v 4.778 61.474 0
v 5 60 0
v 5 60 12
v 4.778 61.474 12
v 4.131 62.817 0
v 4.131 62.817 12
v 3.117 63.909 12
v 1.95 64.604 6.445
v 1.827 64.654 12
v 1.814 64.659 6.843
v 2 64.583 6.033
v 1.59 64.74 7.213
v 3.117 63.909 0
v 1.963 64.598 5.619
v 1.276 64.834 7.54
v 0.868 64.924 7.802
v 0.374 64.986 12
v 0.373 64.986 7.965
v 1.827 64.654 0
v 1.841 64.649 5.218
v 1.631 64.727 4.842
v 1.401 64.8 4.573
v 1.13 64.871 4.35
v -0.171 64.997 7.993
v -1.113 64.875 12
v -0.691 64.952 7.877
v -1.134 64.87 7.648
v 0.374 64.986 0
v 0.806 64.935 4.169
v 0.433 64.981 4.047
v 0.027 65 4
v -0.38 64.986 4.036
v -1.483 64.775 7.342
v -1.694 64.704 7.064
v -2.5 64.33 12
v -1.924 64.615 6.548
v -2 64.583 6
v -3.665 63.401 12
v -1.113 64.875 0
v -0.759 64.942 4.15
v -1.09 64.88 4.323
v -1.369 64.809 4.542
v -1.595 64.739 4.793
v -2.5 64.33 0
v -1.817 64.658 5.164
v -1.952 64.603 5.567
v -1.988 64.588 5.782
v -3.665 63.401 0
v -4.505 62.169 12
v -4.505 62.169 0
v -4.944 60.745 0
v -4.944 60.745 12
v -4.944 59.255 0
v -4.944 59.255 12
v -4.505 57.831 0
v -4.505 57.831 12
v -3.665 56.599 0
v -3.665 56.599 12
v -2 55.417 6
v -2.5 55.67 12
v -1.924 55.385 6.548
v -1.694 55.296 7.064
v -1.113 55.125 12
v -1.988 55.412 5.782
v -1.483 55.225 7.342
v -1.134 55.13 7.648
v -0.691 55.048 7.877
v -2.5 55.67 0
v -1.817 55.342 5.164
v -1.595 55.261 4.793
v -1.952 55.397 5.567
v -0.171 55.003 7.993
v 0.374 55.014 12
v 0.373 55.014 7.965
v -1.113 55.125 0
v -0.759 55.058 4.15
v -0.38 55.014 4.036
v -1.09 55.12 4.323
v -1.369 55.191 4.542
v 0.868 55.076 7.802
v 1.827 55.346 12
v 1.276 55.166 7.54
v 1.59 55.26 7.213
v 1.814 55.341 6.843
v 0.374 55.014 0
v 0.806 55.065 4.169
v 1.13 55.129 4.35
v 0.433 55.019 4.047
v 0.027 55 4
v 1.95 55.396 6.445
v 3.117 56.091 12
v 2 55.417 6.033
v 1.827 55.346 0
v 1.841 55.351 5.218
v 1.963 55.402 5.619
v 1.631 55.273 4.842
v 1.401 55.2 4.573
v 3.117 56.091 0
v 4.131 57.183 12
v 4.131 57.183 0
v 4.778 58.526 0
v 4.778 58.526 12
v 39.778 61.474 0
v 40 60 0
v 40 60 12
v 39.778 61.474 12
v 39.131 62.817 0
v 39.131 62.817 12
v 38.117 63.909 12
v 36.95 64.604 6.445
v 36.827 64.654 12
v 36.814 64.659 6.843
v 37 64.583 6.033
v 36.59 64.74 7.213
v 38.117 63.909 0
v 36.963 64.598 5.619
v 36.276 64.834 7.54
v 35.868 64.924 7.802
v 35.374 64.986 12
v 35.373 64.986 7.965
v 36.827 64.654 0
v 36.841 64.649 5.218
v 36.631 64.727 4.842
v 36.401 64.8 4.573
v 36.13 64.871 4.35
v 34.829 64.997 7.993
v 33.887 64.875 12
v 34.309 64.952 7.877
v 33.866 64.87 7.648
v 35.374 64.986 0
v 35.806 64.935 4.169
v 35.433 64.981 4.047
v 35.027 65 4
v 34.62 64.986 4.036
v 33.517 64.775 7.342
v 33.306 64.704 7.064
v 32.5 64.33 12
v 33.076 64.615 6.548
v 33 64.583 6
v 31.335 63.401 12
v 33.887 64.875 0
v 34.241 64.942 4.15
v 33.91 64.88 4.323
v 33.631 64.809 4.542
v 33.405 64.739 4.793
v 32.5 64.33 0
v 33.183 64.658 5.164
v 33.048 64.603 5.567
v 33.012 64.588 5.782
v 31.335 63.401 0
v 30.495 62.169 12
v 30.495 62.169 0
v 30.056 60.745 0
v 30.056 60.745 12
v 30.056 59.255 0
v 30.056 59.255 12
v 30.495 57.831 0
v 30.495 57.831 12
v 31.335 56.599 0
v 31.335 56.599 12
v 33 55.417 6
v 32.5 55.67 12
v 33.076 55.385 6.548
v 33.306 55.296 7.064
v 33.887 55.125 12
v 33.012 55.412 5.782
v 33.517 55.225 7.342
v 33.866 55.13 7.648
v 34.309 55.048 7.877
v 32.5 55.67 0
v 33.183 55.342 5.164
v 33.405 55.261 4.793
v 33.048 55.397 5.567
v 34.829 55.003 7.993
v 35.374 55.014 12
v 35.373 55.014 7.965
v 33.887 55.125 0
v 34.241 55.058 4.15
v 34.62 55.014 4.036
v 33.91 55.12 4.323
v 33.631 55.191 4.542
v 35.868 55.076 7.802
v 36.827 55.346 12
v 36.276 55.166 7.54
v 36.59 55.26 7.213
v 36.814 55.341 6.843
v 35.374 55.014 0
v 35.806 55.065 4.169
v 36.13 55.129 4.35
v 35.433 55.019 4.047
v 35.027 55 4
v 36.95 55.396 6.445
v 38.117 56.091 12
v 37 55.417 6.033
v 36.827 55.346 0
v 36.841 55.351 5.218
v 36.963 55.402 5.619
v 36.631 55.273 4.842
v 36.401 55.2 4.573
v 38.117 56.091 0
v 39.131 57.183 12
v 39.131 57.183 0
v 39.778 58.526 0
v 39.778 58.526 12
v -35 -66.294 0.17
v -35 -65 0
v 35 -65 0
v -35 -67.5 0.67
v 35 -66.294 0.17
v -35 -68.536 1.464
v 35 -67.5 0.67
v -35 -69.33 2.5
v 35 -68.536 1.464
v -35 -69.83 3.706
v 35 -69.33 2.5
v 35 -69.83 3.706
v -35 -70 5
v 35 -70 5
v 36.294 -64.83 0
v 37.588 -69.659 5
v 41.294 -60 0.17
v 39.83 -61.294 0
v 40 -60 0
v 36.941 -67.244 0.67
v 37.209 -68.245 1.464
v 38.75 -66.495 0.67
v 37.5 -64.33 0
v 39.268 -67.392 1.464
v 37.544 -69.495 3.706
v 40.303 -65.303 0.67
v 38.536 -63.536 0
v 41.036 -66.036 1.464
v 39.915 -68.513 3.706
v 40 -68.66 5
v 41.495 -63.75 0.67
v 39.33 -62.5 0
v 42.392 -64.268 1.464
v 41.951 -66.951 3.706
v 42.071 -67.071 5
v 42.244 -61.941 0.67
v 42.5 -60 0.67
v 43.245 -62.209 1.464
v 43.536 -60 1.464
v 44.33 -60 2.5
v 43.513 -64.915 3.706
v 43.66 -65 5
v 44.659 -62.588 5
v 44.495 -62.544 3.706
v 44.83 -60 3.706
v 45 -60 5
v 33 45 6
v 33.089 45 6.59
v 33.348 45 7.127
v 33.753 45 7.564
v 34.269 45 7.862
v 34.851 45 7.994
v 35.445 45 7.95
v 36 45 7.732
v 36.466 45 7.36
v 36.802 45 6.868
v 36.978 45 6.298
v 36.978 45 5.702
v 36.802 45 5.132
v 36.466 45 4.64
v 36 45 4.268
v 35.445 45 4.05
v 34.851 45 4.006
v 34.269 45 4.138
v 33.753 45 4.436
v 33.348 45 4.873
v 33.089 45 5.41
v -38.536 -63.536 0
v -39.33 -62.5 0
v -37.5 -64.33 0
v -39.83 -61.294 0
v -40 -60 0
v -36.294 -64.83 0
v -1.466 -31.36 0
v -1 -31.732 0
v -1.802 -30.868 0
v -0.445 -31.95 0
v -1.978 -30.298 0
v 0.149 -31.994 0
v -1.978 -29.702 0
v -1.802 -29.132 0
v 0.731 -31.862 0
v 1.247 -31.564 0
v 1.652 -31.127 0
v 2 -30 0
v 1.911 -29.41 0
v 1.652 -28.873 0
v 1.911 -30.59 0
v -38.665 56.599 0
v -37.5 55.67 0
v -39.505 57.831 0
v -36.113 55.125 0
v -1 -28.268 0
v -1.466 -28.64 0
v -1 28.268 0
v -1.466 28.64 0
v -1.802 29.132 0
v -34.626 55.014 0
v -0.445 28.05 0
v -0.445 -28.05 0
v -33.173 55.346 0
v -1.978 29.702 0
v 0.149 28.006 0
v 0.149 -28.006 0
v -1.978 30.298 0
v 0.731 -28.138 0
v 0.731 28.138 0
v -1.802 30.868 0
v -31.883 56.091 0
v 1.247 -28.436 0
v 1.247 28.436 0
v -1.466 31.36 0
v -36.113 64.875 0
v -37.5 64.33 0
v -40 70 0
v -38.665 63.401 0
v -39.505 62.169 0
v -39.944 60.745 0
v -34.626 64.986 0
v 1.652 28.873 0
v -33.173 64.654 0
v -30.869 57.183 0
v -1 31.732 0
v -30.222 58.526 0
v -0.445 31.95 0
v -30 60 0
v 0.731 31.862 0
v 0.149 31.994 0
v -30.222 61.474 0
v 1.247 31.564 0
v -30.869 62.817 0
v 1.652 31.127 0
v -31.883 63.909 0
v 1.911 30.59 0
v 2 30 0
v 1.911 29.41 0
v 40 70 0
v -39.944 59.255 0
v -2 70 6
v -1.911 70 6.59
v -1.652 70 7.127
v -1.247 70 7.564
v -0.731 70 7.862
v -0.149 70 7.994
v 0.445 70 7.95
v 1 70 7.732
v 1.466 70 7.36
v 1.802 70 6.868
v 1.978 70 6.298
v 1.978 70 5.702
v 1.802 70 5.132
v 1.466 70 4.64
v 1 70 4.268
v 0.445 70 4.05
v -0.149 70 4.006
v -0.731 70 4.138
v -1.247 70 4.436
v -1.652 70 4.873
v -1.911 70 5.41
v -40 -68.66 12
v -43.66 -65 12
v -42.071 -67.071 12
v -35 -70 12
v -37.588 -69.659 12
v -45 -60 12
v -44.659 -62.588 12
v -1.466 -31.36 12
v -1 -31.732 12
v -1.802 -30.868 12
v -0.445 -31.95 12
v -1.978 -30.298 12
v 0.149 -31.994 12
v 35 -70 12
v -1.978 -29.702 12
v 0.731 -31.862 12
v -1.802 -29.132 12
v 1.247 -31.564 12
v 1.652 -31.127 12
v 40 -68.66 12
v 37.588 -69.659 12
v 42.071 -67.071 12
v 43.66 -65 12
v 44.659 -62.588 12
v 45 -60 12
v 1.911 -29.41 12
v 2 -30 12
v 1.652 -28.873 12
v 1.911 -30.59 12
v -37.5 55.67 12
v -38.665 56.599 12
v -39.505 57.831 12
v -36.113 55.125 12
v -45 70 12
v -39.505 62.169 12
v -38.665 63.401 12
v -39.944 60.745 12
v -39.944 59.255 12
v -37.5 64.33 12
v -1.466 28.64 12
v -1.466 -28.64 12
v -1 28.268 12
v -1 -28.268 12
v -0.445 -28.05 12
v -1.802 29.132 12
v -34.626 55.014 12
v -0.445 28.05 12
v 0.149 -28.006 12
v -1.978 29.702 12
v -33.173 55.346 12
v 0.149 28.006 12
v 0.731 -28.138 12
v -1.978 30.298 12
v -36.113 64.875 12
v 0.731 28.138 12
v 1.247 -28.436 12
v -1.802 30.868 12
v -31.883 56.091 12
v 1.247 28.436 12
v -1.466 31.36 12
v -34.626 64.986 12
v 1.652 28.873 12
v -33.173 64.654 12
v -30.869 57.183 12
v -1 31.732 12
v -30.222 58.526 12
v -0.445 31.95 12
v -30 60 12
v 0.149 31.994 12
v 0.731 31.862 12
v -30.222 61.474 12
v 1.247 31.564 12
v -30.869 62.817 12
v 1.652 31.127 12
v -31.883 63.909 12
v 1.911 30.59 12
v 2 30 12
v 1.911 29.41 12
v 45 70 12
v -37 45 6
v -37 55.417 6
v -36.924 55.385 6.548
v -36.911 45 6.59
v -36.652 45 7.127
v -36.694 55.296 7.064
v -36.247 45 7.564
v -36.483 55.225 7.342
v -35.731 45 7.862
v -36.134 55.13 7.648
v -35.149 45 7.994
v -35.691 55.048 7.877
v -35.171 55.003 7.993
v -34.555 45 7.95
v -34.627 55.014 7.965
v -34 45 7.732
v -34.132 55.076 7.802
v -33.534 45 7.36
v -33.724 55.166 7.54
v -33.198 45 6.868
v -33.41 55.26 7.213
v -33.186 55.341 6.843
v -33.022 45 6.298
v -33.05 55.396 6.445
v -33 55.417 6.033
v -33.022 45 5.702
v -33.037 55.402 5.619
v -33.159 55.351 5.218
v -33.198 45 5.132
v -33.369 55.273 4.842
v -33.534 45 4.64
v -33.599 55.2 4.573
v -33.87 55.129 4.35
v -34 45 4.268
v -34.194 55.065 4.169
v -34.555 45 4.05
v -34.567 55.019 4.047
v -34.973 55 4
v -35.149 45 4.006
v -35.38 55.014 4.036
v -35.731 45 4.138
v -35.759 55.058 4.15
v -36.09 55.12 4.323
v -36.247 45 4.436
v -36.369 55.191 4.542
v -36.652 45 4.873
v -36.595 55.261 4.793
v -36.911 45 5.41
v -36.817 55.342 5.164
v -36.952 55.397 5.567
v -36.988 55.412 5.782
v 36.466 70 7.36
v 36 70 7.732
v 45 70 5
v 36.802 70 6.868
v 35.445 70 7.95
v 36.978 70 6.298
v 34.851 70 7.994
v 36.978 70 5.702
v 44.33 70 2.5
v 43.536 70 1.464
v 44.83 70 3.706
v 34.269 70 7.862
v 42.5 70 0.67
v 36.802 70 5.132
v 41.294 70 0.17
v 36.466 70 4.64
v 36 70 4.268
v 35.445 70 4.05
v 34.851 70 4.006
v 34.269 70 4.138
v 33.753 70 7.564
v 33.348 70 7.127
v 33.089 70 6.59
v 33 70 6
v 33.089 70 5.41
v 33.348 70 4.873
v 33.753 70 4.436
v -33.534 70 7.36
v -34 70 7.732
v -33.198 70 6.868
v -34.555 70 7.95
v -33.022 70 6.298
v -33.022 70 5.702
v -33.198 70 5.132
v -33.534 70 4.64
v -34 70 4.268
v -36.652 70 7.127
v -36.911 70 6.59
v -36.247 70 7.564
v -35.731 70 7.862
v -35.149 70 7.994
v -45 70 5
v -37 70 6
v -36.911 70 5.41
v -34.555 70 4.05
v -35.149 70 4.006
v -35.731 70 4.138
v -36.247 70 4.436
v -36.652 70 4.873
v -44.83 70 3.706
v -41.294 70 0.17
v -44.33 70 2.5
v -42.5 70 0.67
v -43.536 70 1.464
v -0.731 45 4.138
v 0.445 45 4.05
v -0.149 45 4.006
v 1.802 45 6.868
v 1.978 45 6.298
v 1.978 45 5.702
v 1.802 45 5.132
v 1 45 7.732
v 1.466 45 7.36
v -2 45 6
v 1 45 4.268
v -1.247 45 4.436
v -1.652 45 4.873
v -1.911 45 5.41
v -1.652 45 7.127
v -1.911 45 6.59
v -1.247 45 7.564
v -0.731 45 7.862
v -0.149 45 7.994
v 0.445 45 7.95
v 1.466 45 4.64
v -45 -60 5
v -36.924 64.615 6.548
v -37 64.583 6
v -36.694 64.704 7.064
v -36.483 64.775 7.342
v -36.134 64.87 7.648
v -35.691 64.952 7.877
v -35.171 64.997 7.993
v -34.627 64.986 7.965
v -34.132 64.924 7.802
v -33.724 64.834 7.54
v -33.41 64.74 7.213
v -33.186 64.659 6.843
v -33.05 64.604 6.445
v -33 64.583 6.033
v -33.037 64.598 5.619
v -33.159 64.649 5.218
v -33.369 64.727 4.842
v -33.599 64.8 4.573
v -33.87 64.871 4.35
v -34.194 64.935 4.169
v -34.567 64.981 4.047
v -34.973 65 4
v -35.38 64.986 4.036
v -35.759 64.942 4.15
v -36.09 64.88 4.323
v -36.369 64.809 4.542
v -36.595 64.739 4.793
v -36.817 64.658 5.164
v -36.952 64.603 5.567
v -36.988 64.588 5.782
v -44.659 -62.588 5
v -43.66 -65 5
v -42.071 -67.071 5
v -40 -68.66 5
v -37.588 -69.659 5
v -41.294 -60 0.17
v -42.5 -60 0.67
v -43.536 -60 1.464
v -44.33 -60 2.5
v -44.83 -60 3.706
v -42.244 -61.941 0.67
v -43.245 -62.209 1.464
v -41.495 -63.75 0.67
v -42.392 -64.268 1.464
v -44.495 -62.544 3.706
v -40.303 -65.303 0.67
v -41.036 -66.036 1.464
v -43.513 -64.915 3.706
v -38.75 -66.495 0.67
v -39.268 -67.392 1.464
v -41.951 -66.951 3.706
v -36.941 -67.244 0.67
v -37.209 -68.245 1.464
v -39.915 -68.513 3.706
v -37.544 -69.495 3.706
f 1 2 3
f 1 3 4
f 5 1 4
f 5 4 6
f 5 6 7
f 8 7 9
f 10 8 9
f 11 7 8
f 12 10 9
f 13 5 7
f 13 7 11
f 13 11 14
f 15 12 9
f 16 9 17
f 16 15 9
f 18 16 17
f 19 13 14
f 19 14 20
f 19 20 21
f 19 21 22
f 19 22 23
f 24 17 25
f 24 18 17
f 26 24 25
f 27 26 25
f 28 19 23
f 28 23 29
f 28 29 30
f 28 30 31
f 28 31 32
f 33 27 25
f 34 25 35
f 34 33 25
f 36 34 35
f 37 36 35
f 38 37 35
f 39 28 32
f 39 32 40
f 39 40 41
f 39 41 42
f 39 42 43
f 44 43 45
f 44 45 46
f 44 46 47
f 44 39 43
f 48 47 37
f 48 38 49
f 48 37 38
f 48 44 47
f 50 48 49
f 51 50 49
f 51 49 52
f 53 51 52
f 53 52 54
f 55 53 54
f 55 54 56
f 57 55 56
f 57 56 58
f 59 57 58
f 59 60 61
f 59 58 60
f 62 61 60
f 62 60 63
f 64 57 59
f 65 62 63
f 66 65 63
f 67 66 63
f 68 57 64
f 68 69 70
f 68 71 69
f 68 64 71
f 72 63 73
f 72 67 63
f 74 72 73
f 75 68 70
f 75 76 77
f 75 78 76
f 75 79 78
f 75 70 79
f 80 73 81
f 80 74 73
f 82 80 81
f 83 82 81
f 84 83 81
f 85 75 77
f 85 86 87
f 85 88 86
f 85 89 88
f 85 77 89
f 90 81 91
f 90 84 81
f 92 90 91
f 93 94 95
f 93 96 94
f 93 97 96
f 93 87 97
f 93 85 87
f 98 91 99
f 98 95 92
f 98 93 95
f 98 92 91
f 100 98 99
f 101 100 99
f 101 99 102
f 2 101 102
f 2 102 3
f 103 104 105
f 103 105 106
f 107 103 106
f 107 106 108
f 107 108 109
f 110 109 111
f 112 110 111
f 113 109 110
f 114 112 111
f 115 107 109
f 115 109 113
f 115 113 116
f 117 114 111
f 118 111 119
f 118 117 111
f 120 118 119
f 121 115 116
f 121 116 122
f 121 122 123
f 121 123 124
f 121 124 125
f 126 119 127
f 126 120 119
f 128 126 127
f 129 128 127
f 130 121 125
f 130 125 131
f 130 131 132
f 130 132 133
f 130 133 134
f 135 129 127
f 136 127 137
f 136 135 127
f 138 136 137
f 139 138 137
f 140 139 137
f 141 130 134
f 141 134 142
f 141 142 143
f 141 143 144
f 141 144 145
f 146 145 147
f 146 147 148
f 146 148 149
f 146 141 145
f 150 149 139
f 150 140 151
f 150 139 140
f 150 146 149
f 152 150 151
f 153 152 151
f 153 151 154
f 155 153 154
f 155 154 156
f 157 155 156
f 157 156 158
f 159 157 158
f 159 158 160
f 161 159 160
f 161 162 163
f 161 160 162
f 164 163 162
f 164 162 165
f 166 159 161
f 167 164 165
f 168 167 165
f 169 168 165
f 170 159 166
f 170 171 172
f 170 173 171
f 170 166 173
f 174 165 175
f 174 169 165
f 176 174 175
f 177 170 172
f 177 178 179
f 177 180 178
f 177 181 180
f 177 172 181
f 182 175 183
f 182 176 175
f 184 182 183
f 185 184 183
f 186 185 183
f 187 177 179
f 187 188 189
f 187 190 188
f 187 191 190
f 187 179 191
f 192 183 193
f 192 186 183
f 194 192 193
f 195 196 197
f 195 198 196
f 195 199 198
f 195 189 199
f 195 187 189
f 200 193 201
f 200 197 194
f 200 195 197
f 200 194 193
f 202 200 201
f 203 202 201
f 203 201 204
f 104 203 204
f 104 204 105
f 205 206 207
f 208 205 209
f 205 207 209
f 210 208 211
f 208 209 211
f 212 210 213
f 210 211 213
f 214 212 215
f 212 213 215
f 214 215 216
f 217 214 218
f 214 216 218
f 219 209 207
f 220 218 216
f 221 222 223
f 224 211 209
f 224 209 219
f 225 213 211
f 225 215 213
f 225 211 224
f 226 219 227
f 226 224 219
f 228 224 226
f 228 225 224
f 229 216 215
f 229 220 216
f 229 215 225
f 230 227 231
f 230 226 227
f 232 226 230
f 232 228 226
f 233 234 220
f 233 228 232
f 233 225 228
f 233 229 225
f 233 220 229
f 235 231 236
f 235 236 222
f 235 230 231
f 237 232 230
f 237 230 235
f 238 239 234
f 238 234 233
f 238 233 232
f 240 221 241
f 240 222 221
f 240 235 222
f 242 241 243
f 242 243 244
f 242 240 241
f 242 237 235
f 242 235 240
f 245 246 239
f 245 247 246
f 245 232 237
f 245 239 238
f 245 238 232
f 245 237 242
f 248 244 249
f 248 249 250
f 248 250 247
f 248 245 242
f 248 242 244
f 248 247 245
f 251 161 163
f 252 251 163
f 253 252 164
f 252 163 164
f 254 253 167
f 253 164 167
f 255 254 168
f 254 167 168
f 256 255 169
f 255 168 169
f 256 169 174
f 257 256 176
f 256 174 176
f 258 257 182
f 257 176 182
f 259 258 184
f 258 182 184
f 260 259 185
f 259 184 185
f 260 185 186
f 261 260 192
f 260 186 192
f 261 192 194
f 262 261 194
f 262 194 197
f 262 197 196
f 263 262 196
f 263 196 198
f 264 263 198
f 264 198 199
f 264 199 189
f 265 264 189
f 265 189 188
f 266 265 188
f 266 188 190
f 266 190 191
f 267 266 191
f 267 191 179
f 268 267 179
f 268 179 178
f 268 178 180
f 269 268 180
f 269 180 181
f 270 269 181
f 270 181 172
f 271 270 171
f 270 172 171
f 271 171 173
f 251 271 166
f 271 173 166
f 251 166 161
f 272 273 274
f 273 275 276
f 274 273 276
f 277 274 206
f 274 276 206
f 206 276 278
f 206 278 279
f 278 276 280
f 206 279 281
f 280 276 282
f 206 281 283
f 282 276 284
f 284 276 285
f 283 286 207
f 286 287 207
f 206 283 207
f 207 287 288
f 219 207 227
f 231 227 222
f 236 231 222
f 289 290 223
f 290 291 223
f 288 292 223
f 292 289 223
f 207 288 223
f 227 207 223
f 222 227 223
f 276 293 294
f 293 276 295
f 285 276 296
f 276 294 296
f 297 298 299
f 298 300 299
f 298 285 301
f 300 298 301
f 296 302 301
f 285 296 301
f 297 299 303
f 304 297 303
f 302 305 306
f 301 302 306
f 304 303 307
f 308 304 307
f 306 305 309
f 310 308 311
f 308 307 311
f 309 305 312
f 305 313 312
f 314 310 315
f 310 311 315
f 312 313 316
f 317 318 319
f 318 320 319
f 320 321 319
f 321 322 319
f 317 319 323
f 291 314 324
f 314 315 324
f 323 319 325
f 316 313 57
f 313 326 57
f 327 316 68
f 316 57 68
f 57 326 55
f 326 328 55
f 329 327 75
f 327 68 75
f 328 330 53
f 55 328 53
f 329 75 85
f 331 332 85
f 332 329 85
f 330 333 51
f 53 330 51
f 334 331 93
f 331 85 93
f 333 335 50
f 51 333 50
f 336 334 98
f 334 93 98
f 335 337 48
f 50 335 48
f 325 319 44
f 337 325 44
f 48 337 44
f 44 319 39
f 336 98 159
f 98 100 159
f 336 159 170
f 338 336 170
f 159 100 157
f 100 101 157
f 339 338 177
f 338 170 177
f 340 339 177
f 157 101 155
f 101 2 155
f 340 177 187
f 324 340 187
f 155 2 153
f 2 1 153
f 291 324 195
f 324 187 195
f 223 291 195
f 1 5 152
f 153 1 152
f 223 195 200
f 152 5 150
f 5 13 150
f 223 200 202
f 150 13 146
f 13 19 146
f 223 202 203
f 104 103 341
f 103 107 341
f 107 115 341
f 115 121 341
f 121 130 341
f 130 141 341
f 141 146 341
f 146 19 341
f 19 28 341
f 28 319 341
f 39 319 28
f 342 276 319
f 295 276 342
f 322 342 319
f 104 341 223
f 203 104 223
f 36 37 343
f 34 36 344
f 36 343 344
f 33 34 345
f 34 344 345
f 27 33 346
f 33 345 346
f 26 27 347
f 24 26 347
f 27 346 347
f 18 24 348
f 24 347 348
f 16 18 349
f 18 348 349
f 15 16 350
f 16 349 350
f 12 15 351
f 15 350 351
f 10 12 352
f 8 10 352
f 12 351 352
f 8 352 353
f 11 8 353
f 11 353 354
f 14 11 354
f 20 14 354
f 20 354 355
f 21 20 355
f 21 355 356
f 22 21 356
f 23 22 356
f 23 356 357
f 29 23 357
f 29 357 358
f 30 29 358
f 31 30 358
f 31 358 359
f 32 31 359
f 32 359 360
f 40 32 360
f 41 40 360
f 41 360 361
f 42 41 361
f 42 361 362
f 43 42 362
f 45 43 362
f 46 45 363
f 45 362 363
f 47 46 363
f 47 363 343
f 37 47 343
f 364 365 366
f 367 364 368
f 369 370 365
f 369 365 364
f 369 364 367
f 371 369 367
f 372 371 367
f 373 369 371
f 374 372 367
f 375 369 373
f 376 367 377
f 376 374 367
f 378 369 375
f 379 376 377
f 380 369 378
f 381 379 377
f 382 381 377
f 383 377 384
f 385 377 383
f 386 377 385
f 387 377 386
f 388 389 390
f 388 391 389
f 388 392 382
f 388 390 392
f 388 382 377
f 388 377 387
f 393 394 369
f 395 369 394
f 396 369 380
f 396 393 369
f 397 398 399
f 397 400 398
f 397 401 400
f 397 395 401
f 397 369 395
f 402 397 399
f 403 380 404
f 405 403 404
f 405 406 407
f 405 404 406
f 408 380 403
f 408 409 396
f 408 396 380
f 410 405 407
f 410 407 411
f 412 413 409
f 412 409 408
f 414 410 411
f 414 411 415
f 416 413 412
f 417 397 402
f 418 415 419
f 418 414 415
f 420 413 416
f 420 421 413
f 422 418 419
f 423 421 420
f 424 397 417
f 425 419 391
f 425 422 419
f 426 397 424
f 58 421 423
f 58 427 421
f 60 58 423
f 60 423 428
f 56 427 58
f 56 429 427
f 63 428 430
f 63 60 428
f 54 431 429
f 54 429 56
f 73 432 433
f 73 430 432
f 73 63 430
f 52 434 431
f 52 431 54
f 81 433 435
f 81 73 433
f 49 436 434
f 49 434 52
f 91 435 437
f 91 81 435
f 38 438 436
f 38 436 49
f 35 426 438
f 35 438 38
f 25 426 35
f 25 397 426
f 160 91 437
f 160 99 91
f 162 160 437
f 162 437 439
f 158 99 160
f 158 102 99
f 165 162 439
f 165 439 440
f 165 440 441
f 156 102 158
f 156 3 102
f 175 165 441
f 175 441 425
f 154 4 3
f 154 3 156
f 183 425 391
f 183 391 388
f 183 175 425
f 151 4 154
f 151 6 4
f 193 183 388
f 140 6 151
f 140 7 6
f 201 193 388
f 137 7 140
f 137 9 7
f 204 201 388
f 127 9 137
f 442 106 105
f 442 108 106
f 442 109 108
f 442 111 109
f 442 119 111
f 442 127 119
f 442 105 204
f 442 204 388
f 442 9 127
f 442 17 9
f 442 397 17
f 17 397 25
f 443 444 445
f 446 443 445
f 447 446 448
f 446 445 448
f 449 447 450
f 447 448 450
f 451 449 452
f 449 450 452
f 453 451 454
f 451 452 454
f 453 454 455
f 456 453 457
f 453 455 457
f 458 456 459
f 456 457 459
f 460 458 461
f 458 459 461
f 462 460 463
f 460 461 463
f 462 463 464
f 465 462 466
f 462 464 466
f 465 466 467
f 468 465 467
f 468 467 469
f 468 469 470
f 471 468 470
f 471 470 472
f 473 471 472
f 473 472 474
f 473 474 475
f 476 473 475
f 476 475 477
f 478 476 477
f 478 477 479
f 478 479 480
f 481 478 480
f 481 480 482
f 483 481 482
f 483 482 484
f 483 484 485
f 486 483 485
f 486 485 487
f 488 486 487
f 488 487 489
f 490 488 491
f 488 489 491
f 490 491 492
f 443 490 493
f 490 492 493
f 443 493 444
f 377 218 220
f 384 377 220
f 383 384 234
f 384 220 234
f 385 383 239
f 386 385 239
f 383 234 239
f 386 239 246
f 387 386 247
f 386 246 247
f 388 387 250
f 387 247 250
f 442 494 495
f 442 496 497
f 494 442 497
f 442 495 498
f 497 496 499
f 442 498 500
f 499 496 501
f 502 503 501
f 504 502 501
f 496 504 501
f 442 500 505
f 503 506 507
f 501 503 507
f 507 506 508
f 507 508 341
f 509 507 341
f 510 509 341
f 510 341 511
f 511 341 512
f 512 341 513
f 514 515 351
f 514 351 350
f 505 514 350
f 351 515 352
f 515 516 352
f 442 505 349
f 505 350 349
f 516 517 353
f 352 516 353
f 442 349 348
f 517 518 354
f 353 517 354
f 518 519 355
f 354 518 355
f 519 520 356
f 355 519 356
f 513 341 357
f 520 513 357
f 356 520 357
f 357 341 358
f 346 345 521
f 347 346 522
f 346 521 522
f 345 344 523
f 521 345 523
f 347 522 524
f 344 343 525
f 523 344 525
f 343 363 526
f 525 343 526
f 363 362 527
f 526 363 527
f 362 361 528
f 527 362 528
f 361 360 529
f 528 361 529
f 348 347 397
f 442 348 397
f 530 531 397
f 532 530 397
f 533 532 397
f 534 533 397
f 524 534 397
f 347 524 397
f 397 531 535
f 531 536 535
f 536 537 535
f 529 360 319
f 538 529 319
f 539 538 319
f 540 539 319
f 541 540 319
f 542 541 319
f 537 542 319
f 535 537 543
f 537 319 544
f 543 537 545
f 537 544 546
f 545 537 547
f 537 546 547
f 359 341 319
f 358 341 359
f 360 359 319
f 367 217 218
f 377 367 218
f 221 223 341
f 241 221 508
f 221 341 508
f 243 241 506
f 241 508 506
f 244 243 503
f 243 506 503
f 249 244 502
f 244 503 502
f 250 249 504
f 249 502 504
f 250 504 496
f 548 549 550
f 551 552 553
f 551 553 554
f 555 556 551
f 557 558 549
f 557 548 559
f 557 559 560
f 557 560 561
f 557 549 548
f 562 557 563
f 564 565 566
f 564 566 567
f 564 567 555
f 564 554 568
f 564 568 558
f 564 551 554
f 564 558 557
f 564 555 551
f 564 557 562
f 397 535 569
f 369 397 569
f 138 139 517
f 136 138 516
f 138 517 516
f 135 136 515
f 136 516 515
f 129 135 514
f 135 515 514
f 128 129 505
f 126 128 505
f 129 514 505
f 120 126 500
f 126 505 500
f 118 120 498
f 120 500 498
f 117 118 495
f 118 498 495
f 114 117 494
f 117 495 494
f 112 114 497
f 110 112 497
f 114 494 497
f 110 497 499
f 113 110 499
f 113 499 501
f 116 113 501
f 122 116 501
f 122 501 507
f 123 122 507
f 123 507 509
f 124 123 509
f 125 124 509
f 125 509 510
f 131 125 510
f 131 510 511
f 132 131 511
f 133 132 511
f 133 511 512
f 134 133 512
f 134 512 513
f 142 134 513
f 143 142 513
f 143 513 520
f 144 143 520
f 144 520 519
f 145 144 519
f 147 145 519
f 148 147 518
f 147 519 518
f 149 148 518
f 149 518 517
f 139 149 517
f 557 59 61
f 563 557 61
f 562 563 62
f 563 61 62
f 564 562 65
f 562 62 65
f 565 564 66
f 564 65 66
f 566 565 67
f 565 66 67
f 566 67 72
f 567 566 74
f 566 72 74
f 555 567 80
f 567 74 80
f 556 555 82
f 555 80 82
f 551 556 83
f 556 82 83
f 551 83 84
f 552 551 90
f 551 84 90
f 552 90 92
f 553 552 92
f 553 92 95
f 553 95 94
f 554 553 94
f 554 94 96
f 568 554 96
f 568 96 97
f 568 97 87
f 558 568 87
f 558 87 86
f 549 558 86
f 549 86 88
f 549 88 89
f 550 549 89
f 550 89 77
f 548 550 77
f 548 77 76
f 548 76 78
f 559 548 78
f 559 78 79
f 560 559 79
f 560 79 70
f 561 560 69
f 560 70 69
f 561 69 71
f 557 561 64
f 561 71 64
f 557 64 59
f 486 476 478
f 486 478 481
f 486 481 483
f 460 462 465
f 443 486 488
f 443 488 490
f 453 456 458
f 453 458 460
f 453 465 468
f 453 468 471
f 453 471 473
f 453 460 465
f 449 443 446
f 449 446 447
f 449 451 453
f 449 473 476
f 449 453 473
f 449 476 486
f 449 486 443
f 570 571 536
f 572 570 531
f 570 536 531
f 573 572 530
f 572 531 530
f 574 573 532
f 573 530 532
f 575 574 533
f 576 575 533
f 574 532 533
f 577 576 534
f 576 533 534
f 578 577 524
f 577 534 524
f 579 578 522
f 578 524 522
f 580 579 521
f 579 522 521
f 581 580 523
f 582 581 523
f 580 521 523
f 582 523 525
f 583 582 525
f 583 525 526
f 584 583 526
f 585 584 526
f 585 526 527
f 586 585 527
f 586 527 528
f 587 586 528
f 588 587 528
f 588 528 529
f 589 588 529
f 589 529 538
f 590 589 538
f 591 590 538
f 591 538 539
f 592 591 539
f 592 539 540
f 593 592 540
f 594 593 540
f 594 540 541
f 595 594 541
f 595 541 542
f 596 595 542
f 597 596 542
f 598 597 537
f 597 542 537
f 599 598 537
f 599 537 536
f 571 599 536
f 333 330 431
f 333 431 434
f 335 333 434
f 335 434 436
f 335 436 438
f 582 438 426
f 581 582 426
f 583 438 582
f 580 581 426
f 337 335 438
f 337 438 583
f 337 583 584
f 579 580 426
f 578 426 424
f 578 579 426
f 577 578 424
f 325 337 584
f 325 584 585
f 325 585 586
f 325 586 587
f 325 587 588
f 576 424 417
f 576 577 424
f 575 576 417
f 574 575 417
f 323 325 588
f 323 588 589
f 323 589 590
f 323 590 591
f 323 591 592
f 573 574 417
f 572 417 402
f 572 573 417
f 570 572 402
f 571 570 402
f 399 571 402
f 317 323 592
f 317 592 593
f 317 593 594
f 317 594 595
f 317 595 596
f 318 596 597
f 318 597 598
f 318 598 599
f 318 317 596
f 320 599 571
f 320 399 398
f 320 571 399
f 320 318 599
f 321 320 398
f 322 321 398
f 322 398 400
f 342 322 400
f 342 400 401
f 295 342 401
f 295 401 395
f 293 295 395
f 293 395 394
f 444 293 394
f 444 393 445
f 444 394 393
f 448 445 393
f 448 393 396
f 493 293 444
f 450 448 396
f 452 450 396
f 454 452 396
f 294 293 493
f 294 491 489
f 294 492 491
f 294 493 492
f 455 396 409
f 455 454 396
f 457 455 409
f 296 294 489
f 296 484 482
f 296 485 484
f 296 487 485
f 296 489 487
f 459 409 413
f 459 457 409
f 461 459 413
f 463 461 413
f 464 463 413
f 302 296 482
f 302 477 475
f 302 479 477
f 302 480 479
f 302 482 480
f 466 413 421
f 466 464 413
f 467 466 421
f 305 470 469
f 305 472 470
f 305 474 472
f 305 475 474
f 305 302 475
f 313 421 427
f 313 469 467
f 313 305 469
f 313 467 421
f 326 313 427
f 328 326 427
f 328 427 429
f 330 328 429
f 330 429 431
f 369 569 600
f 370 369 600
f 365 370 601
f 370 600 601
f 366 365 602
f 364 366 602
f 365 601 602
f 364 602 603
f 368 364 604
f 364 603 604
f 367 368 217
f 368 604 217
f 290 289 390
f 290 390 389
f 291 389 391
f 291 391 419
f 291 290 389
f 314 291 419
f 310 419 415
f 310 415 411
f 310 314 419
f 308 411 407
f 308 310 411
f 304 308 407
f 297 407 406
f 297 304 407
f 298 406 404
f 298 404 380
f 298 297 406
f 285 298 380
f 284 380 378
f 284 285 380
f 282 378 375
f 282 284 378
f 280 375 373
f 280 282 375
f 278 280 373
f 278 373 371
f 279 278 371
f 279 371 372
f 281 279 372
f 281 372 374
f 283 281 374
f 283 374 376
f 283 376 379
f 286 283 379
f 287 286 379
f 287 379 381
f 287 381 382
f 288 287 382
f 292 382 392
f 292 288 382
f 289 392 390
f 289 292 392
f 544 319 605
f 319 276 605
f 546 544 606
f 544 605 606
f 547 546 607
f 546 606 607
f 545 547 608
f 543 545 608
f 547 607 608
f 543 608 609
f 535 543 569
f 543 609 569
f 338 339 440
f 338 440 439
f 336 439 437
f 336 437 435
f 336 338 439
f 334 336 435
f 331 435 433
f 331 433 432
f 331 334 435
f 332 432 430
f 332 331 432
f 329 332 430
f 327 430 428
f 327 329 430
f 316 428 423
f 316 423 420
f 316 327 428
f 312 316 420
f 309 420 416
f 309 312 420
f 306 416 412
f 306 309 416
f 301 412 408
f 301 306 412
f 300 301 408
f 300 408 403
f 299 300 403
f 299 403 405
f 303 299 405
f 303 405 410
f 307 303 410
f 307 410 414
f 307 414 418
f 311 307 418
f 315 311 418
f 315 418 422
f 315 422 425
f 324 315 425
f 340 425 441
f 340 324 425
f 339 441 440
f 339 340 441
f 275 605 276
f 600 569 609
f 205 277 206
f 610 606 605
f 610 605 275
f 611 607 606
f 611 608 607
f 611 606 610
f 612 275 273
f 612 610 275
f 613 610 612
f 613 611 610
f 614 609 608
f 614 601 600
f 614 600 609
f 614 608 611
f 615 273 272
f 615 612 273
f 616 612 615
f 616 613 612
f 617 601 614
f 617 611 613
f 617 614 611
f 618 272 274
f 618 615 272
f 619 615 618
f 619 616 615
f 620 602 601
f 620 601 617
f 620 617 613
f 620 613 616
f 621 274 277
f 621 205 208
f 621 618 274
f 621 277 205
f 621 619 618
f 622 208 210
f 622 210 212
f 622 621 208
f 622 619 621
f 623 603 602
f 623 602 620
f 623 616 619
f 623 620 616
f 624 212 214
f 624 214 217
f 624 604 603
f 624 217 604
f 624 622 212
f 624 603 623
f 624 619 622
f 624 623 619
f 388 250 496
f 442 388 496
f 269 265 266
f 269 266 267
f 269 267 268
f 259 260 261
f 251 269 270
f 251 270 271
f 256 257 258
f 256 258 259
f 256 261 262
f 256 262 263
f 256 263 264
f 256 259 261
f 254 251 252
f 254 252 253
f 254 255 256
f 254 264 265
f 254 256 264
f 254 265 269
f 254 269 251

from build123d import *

# Parameters (mm, degrees)
F0_R     = 2
F0_R_2   = 5
F1_DEPTH = 12
F2_R     = 2
F3_DEPTH = 25
F4_R     = 4.99999


# Not quite as in the source:
# - a fillet or chamfer is up to 0.001 mm smaller than in the source, because OpenCascade refuses the exact size


with BuildPart() as f1:
    # F0 (on Top) → F1 (new body)
    with BuildSketch(Plane.XY):
        with BuildLine():
            Line((-35.0000017881, -70), (35.0000017881, -70))
            ThreePointArc((35.0000017881, -70), (42.0710696, -67.0710678119), (45.0000017881, -60))
            Line((45.0000017881, -60), (45.0000017881, 70))
            Line((45.0000017881, 70), (-45.0000017881, 70))
            Line((-45.0000017881, 70), (-45.0000017881, -60))
            ThreePointArc((-45.0000017881, -60), (-42.0710696, -67.0710678119), (-35.0000017881, -70))
        make_face()
        with Locations((0, -30)):
            Circle(F0_R, mode=Mode.SUBTRACT)
        with Locations((0, 30)):
            Circle(F0_R, mode=Mode.SUBTRACT)
        with Locations((-35.0000017881, 60)):
            Circle(F0_R_2, mode=Mode.SUBTRACT)
        with Locations((0, 60)):
            Circle(F0_R_2, mode=Mode.SUBTRACT)
        with Locations((35.0000017881, 60)):
            Circle(F0_R_2, mode=Mode.SUBTRACT)
    extrude(amount=F1_DEPTH)

    # F2 (on face) → F3 (cut)
    with BuildSketch(Plane(origin=(0, 70, 0), x_dir=(-1, 0, 0), z_dir=(0, 1, 0))):
        with Locations((0, 6)):
            Circle(F2_R)
        with Locations((35.0000017881, 6)):
            Circle(F2_R)
        with Locations((-35.0000017881, 6)):
            Circle(F2_R)
    extrude(amount=-F3_DEPTH, mode=Mode.SUBTRACT)

    # F4 (radius 5 in the source; OpenCascade refuses exactly that, so slightly less here)
    f4_edges = [f1.edges().sort_by_distance(p)[0] for p in [
        (45.000002, 5, 0),
    ]]
    fillet(f4_edges, radius=F4_R)


solid = f1.part
